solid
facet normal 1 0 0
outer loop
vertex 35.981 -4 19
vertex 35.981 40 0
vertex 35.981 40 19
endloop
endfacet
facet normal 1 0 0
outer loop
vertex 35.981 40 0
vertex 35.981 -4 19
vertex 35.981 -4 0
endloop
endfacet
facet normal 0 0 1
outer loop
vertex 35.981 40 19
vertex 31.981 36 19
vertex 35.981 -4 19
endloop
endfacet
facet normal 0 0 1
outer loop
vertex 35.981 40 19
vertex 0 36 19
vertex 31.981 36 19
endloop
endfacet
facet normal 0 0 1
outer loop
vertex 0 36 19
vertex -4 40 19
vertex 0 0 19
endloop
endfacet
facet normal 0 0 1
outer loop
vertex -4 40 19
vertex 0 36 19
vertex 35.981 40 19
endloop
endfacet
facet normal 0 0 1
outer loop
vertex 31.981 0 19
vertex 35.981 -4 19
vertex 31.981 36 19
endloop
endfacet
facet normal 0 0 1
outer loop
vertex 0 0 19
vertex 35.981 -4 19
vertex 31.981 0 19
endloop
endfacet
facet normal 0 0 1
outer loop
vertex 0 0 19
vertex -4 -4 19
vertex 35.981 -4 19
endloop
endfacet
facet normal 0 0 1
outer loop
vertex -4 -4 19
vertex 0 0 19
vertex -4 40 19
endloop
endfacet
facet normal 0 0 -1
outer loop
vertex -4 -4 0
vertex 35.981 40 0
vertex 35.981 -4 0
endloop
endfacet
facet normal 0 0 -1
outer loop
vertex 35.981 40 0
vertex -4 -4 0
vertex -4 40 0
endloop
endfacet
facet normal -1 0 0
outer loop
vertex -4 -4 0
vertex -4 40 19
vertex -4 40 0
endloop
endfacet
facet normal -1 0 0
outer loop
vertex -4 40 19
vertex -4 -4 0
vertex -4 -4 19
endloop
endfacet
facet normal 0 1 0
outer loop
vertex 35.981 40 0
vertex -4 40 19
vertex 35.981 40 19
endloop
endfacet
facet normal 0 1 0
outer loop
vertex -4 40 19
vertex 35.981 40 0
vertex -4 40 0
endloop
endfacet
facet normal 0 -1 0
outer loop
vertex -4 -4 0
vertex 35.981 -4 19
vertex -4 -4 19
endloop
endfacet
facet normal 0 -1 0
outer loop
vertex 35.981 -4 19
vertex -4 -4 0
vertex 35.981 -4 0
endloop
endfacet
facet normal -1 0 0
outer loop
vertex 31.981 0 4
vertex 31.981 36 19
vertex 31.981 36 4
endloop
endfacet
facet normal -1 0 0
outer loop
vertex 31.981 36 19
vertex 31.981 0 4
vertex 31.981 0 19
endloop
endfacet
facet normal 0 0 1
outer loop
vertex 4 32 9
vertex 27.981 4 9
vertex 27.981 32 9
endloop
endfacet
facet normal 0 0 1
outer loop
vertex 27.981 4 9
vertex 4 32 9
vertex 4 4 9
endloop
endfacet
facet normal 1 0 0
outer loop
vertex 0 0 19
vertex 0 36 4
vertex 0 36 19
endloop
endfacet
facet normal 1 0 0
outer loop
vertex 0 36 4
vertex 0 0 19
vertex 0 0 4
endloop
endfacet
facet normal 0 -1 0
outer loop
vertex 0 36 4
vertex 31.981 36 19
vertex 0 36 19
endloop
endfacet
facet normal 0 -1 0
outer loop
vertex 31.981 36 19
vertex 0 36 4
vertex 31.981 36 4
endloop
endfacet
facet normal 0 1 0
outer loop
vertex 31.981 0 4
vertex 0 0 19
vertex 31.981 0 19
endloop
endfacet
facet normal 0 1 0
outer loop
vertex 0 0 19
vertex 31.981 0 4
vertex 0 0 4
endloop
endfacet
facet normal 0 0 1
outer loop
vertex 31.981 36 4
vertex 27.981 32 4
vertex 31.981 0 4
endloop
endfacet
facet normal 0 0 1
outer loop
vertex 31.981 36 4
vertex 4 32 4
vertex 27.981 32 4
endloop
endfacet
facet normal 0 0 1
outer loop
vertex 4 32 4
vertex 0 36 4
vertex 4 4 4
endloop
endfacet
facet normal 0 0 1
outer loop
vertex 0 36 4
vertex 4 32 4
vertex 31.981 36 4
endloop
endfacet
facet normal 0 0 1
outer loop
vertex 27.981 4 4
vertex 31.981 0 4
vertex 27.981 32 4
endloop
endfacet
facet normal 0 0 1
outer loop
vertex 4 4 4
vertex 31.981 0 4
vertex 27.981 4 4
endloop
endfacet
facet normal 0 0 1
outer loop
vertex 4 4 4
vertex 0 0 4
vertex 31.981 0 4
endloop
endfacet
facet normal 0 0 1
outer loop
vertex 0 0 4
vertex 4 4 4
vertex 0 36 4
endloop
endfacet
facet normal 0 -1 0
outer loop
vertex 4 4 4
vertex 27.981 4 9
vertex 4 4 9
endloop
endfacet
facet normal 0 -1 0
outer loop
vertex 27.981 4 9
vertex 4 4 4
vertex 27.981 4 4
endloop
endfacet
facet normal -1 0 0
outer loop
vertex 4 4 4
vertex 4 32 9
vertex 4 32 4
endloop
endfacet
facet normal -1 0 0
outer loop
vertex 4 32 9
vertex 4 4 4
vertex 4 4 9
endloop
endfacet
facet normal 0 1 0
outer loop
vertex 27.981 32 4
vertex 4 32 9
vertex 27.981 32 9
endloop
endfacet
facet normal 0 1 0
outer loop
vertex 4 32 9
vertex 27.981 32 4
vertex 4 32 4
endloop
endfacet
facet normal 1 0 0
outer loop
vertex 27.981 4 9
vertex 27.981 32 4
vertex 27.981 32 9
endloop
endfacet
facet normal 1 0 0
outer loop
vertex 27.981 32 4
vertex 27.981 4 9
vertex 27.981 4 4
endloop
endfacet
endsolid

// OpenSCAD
difference() {
	difference() {
		difference() {
			difference() {
				difference() {
					translate(v = [15.9903810568, 18.0000000000, 9.5000000000]) {
						cube(center = true, size = [39.9807621135, 44.0000000000, 19]);
					}
					translate(v = [15.9903810568, 18.0000000000, 16.0000000000]) {
						cube(center = true, size = [31.9807621135, 36.0000000000, 14]);
					}
				}
				translate(v = [15.9903810568, 2.0000000000, 13.5000000000]) {
					cube(center = true, size = [31.9807621135, 4, 19]);
				}
			}
			translate(v = [2.0000000000, 18.0000000000, 13.5000000000]) {
				cube(center = true, size = [4, 36.0000000000, 19]);
			}
		}
		translate(v = [15.9903810568, 34.0000000000, 13.5000000000]) {
			cube(center = true, size = [31.9807621135, 4, 19]);
		}
	}
	translate(v = [29.9807621135, 18.0000000000, 13.5000000000]) {
		cube(center = true, size = [4, 36.0000000000, 19]);
	}
}
